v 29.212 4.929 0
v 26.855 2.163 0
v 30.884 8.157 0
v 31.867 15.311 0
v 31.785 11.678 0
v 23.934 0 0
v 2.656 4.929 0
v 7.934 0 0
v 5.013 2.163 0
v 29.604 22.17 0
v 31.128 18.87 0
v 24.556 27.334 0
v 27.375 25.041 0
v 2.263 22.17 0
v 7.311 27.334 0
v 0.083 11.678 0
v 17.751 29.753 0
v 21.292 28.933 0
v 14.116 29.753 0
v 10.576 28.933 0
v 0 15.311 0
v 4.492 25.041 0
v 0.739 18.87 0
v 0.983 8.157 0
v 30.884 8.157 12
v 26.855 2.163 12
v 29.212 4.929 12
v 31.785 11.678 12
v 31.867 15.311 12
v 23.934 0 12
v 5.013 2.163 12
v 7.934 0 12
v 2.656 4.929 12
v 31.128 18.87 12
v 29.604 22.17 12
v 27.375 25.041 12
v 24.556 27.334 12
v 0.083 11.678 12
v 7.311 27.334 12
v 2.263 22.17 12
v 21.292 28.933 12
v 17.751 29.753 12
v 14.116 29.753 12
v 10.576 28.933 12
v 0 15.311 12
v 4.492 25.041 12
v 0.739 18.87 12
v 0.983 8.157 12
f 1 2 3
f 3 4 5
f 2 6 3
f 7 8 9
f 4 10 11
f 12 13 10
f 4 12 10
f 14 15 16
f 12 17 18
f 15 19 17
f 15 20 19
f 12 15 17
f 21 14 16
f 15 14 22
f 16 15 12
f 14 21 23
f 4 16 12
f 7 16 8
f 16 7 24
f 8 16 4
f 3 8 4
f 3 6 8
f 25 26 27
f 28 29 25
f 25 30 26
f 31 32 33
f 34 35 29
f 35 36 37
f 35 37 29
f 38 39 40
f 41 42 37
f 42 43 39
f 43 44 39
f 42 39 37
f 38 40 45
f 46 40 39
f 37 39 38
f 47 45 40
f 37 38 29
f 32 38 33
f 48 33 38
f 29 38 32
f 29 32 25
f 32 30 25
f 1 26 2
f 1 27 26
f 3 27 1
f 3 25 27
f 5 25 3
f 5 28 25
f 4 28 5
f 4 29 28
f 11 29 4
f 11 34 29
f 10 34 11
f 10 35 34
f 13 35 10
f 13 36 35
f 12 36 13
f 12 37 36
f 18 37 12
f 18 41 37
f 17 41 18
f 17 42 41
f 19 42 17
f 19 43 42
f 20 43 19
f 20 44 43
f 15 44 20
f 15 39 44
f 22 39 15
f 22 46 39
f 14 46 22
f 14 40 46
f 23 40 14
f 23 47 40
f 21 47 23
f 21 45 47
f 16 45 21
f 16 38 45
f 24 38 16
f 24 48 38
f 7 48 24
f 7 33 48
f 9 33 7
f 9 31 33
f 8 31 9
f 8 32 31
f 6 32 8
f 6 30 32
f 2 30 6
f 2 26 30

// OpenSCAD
$fn = 32;

// ----------------------------------------------------------------------
// Flat adaptor: single_d, 12 mm thick
// ----------------------------------------------------------------------

// --- parameters (mm) ---
profile_height = 12;      // extrusion height
profile_points = 24;      // points of the closed outline

profile = [[23.934, 0], [26.855, 2.163], [29.212, 4.929], [30.884, 8.157], [31.785, 11.678], [31.867, 15.311], [31.128, 18.87], [29.604, 22.17], [27.375, 25.041], [24.556, 27.334], [21.292, 28.933], [17.751, 29.753], [14.116, 29.753], [10.576, 28.933], [7.311, 27.334], [4.492, 25.041], [2.263, 22.17], [0.739, 18.87], [0, 15.311], [0.083, 11.678], [0.983, 8.157], [2.656, 4.929], [5.013, 2.163], [7.934, 0]];  // single closed polygon, 24 points, counter clockwise

// --- the one profile operation ---
linear_extrude(height = profile_height) polygon(points = profile);
